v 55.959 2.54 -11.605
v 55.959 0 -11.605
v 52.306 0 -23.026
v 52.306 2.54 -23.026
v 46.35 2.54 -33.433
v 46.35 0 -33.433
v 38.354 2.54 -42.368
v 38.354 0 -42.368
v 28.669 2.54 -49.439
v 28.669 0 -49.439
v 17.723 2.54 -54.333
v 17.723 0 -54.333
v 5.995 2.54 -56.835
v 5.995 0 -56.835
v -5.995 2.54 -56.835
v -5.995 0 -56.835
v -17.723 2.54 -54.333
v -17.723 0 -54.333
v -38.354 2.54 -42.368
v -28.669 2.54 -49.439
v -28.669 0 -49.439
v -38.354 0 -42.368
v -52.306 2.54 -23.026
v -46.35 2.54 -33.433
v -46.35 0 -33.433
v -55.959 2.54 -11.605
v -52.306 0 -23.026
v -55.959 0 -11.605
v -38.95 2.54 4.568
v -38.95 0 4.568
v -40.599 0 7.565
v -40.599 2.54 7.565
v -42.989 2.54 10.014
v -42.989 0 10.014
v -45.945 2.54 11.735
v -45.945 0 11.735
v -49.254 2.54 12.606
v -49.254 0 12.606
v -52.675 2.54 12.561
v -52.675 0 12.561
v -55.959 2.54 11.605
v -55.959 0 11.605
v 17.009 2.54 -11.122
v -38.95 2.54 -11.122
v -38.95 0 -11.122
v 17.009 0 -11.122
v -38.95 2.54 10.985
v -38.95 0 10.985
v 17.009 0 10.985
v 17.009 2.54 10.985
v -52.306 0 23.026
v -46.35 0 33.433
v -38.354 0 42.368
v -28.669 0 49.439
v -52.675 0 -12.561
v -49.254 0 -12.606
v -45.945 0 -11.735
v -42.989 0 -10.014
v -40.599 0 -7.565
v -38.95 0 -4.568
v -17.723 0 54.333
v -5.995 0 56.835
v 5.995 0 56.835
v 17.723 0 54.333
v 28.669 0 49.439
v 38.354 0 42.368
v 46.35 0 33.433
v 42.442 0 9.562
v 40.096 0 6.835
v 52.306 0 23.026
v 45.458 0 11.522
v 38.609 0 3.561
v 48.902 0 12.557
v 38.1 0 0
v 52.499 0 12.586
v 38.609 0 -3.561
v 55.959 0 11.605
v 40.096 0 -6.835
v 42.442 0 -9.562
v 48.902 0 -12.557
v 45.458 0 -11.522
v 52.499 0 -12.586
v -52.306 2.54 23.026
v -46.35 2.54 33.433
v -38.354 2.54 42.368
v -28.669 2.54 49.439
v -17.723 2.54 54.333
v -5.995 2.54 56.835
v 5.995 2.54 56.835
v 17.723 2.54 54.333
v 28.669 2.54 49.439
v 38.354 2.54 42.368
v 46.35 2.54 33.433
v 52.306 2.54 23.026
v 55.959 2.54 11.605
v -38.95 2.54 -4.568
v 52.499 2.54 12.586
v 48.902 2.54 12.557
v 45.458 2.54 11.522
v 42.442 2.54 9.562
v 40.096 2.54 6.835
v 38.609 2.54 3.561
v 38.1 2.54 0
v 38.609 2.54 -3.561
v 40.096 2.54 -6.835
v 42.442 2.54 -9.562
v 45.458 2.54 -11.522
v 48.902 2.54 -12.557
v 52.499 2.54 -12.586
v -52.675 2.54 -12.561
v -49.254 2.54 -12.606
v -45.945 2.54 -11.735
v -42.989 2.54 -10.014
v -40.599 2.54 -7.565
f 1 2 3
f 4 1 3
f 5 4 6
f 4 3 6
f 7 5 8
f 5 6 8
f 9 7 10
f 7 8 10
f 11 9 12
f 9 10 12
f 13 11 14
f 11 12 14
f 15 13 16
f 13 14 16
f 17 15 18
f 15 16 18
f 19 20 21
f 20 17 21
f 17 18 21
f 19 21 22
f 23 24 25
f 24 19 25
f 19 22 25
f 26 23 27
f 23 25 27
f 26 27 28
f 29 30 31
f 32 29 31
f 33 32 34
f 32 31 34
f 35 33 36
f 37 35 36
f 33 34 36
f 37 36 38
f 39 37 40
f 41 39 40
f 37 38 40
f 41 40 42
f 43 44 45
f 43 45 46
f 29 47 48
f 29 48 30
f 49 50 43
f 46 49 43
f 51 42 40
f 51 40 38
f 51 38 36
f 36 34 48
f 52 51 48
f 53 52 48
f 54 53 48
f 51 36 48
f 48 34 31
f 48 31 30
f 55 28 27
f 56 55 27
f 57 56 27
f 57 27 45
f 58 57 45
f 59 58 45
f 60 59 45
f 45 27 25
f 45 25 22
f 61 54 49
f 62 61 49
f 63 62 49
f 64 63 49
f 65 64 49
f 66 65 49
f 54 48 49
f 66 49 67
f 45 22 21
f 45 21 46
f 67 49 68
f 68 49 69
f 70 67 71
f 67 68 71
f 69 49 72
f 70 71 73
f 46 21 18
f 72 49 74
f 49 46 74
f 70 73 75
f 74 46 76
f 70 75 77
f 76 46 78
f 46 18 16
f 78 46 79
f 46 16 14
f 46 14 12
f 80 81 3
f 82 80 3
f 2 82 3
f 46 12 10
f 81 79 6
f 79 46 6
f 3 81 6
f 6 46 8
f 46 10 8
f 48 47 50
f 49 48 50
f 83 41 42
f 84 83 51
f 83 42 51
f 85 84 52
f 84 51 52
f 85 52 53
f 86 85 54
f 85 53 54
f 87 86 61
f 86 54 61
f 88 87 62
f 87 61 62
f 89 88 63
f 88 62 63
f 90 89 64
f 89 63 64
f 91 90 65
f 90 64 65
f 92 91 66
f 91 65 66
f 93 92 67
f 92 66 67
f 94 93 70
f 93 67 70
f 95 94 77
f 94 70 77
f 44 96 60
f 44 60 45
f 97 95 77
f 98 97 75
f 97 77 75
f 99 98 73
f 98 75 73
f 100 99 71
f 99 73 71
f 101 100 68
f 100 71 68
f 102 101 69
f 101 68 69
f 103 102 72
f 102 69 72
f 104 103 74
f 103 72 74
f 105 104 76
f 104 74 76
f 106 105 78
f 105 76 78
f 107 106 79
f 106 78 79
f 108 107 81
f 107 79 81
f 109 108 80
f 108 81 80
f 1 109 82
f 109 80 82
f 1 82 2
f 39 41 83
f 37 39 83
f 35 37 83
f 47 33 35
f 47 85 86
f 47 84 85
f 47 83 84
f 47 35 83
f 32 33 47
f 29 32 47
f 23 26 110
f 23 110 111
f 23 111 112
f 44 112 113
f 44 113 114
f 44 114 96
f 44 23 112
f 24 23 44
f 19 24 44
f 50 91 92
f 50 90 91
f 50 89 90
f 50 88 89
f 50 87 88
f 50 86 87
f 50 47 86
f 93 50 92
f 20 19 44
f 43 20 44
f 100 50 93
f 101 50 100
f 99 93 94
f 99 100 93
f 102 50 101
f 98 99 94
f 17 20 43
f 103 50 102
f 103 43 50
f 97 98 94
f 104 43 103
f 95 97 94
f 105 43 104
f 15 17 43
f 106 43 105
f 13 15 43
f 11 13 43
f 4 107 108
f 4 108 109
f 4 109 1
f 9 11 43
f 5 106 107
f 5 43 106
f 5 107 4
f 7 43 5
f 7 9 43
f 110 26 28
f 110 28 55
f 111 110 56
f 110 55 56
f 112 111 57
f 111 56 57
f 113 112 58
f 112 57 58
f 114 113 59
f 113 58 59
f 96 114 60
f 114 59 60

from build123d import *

# Parameters (mm, degrees)
SKETCH1_R           = 57.15
BOSS_EXTRUDE1_DEPTH = 2.54
SKETCH3_W           = 55.958888442
SKETCH3_H           = 22.106904705
CUT_EXTRUDE1_DEPTH  = 2.54
SKETCH4_R           = 12.7
CUT_EXTRUDE2_DEPTH  = 2.54
SKETCH5_R           = 12.7
CUT_EXTRUDE3_DEPTH  = 2.54


with BuildPart() as part:
    # Sketch1 → Boss-Extrude1 (new body)
    with BuildSketch(Plane(origin=(0, 0, 0), x_dir=(1, 0, 0), z_dir=(0, 1, 0))):
        Circle(SKETCH1_R)
    extrude(amount=BOSS_EXTRUDE1_DEPTH)

    # Sketch3 → Cut-Extrude1 (cut)
    with BuildSketch(Plane(origin=(0, 2.54, 0), x_dir=(1, 0, 0), z_dir=(0, 1, 0))):
        with Locations((-10.970545038, 0.068604303)):
            Rectangle(SKETCH3_W, SKETCH3_H)
    extrude(amount=-CUT_EXTRUDE1_DEPTH, mode=Mode.SUBTRACT)

    # Sketch4 → Cut-Extrude2 (cut)
    with BuildSketch(Plane(origin=(0, 0, 0), x_dir=(-1, 0, 0), z_dir=(0, -1, 0))):
        with Locations((50.8, 0)):
            Circle(SKETCH4_R)
    extrude(amount=-CUT_EXTRUDE2_DEPTH, mode=Mode.SUBTRACT)

    # Sketch5 → Cut-Extrude3 (cut)
    with BuildSketch(Plane.XZ):
        with Locations((50.8, 0)):
            Circle(SKETCH5_R)
    extrude(amount=-CUT_EXTRUDE3_DEPTH, mode=Mode.SUBTRACT)


solid = part.part
